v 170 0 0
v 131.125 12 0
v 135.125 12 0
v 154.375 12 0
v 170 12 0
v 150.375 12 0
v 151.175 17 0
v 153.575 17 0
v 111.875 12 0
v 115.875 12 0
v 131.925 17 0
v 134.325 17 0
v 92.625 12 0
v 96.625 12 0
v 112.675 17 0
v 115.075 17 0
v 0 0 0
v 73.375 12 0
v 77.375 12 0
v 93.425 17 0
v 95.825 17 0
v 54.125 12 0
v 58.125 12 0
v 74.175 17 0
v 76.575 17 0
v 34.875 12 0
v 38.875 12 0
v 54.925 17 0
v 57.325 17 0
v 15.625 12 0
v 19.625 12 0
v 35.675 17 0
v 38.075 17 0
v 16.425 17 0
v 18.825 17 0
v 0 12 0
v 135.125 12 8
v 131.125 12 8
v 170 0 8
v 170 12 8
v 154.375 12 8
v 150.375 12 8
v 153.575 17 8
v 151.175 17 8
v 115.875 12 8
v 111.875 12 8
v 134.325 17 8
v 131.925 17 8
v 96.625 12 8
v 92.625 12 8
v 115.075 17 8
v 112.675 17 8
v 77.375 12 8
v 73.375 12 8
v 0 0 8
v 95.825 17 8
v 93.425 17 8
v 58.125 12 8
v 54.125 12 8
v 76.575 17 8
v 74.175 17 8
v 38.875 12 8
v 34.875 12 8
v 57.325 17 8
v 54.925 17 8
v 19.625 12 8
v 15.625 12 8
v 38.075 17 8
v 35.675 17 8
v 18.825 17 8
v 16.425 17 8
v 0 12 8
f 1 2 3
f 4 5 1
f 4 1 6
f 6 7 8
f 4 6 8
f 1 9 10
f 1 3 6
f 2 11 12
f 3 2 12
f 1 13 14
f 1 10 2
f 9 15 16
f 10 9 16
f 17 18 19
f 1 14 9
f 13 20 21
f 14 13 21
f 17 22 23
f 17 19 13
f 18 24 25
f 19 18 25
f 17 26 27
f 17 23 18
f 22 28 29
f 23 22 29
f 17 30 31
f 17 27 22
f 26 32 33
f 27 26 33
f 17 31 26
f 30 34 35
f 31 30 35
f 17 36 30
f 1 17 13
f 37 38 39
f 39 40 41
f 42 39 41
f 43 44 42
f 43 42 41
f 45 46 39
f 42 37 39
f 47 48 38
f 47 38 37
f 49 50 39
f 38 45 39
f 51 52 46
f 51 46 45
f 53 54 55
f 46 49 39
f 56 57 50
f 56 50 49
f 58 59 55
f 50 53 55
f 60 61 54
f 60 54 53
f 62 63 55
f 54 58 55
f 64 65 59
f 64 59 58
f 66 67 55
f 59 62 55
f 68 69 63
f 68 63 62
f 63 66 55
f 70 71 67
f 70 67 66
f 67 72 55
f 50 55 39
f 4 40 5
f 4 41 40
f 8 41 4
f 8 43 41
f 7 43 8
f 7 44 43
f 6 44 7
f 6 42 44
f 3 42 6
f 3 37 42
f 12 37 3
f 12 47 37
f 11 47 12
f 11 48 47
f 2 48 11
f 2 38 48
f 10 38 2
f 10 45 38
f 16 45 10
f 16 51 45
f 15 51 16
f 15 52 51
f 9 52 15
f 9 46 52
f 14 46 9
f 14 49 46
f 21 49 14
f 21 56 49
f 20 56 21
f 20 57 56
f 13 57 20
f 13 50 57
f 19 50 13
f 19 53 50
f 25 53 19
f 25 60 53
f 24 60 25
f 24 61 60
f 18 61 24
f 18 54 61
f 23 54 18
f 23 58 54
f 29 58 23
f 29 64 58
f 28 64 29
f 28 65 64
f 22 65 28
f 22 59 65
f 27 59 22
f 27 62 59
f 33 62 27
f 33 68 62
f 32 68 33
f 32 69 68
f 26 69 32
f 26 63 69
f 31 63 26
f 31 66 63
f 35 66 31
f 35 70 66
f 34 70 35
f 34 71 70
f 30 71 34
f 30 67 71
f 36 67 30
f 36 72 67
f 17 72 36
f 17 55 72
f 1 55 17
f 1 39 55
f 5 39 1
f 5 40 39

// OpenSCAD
$fn = 32;

// ----------------------------------------------------------------------
// Gear rack: 8 teeth on a 170 mm bar, pitch 19.25 mm
// ----------------------------------------------------------------------

// --- parameters (mm) ---
profile_height = 8;       // extrusion height
profile_points = 36;      // points of the closed outline

profile = [[0, 0], [170, 0], [170, 12], [154.375, 12], [153.575, 17], [151.175, 17], [150.375, 12], [135.125, 12], [134.325, 17], [131.925, 17], [131.125, 12], [115.875, 12], [115.075, 17], [112.675, 17], [111.875, 12], [96.625, 12], [95.825, 17], [93.425, 17], [92.625, 12], [77.375, 12], [76.575, 17], [74.175, 17], [73.375, 12], [58.125, 12], [57.325, 17], [54.925, 17], [54.125, 12], [38.875, 12], [38.075, 17], [35.675, 17], [34.875, 12], [19.625, 12], [18.825, 17], [16.425, 17], [15.625, 12], [0, 12]];  // single closed polygon, 36 points, counter clockwise

// --- the one profile operation ---
linear_extrude(height = profile_height) polygon(points = profile);
